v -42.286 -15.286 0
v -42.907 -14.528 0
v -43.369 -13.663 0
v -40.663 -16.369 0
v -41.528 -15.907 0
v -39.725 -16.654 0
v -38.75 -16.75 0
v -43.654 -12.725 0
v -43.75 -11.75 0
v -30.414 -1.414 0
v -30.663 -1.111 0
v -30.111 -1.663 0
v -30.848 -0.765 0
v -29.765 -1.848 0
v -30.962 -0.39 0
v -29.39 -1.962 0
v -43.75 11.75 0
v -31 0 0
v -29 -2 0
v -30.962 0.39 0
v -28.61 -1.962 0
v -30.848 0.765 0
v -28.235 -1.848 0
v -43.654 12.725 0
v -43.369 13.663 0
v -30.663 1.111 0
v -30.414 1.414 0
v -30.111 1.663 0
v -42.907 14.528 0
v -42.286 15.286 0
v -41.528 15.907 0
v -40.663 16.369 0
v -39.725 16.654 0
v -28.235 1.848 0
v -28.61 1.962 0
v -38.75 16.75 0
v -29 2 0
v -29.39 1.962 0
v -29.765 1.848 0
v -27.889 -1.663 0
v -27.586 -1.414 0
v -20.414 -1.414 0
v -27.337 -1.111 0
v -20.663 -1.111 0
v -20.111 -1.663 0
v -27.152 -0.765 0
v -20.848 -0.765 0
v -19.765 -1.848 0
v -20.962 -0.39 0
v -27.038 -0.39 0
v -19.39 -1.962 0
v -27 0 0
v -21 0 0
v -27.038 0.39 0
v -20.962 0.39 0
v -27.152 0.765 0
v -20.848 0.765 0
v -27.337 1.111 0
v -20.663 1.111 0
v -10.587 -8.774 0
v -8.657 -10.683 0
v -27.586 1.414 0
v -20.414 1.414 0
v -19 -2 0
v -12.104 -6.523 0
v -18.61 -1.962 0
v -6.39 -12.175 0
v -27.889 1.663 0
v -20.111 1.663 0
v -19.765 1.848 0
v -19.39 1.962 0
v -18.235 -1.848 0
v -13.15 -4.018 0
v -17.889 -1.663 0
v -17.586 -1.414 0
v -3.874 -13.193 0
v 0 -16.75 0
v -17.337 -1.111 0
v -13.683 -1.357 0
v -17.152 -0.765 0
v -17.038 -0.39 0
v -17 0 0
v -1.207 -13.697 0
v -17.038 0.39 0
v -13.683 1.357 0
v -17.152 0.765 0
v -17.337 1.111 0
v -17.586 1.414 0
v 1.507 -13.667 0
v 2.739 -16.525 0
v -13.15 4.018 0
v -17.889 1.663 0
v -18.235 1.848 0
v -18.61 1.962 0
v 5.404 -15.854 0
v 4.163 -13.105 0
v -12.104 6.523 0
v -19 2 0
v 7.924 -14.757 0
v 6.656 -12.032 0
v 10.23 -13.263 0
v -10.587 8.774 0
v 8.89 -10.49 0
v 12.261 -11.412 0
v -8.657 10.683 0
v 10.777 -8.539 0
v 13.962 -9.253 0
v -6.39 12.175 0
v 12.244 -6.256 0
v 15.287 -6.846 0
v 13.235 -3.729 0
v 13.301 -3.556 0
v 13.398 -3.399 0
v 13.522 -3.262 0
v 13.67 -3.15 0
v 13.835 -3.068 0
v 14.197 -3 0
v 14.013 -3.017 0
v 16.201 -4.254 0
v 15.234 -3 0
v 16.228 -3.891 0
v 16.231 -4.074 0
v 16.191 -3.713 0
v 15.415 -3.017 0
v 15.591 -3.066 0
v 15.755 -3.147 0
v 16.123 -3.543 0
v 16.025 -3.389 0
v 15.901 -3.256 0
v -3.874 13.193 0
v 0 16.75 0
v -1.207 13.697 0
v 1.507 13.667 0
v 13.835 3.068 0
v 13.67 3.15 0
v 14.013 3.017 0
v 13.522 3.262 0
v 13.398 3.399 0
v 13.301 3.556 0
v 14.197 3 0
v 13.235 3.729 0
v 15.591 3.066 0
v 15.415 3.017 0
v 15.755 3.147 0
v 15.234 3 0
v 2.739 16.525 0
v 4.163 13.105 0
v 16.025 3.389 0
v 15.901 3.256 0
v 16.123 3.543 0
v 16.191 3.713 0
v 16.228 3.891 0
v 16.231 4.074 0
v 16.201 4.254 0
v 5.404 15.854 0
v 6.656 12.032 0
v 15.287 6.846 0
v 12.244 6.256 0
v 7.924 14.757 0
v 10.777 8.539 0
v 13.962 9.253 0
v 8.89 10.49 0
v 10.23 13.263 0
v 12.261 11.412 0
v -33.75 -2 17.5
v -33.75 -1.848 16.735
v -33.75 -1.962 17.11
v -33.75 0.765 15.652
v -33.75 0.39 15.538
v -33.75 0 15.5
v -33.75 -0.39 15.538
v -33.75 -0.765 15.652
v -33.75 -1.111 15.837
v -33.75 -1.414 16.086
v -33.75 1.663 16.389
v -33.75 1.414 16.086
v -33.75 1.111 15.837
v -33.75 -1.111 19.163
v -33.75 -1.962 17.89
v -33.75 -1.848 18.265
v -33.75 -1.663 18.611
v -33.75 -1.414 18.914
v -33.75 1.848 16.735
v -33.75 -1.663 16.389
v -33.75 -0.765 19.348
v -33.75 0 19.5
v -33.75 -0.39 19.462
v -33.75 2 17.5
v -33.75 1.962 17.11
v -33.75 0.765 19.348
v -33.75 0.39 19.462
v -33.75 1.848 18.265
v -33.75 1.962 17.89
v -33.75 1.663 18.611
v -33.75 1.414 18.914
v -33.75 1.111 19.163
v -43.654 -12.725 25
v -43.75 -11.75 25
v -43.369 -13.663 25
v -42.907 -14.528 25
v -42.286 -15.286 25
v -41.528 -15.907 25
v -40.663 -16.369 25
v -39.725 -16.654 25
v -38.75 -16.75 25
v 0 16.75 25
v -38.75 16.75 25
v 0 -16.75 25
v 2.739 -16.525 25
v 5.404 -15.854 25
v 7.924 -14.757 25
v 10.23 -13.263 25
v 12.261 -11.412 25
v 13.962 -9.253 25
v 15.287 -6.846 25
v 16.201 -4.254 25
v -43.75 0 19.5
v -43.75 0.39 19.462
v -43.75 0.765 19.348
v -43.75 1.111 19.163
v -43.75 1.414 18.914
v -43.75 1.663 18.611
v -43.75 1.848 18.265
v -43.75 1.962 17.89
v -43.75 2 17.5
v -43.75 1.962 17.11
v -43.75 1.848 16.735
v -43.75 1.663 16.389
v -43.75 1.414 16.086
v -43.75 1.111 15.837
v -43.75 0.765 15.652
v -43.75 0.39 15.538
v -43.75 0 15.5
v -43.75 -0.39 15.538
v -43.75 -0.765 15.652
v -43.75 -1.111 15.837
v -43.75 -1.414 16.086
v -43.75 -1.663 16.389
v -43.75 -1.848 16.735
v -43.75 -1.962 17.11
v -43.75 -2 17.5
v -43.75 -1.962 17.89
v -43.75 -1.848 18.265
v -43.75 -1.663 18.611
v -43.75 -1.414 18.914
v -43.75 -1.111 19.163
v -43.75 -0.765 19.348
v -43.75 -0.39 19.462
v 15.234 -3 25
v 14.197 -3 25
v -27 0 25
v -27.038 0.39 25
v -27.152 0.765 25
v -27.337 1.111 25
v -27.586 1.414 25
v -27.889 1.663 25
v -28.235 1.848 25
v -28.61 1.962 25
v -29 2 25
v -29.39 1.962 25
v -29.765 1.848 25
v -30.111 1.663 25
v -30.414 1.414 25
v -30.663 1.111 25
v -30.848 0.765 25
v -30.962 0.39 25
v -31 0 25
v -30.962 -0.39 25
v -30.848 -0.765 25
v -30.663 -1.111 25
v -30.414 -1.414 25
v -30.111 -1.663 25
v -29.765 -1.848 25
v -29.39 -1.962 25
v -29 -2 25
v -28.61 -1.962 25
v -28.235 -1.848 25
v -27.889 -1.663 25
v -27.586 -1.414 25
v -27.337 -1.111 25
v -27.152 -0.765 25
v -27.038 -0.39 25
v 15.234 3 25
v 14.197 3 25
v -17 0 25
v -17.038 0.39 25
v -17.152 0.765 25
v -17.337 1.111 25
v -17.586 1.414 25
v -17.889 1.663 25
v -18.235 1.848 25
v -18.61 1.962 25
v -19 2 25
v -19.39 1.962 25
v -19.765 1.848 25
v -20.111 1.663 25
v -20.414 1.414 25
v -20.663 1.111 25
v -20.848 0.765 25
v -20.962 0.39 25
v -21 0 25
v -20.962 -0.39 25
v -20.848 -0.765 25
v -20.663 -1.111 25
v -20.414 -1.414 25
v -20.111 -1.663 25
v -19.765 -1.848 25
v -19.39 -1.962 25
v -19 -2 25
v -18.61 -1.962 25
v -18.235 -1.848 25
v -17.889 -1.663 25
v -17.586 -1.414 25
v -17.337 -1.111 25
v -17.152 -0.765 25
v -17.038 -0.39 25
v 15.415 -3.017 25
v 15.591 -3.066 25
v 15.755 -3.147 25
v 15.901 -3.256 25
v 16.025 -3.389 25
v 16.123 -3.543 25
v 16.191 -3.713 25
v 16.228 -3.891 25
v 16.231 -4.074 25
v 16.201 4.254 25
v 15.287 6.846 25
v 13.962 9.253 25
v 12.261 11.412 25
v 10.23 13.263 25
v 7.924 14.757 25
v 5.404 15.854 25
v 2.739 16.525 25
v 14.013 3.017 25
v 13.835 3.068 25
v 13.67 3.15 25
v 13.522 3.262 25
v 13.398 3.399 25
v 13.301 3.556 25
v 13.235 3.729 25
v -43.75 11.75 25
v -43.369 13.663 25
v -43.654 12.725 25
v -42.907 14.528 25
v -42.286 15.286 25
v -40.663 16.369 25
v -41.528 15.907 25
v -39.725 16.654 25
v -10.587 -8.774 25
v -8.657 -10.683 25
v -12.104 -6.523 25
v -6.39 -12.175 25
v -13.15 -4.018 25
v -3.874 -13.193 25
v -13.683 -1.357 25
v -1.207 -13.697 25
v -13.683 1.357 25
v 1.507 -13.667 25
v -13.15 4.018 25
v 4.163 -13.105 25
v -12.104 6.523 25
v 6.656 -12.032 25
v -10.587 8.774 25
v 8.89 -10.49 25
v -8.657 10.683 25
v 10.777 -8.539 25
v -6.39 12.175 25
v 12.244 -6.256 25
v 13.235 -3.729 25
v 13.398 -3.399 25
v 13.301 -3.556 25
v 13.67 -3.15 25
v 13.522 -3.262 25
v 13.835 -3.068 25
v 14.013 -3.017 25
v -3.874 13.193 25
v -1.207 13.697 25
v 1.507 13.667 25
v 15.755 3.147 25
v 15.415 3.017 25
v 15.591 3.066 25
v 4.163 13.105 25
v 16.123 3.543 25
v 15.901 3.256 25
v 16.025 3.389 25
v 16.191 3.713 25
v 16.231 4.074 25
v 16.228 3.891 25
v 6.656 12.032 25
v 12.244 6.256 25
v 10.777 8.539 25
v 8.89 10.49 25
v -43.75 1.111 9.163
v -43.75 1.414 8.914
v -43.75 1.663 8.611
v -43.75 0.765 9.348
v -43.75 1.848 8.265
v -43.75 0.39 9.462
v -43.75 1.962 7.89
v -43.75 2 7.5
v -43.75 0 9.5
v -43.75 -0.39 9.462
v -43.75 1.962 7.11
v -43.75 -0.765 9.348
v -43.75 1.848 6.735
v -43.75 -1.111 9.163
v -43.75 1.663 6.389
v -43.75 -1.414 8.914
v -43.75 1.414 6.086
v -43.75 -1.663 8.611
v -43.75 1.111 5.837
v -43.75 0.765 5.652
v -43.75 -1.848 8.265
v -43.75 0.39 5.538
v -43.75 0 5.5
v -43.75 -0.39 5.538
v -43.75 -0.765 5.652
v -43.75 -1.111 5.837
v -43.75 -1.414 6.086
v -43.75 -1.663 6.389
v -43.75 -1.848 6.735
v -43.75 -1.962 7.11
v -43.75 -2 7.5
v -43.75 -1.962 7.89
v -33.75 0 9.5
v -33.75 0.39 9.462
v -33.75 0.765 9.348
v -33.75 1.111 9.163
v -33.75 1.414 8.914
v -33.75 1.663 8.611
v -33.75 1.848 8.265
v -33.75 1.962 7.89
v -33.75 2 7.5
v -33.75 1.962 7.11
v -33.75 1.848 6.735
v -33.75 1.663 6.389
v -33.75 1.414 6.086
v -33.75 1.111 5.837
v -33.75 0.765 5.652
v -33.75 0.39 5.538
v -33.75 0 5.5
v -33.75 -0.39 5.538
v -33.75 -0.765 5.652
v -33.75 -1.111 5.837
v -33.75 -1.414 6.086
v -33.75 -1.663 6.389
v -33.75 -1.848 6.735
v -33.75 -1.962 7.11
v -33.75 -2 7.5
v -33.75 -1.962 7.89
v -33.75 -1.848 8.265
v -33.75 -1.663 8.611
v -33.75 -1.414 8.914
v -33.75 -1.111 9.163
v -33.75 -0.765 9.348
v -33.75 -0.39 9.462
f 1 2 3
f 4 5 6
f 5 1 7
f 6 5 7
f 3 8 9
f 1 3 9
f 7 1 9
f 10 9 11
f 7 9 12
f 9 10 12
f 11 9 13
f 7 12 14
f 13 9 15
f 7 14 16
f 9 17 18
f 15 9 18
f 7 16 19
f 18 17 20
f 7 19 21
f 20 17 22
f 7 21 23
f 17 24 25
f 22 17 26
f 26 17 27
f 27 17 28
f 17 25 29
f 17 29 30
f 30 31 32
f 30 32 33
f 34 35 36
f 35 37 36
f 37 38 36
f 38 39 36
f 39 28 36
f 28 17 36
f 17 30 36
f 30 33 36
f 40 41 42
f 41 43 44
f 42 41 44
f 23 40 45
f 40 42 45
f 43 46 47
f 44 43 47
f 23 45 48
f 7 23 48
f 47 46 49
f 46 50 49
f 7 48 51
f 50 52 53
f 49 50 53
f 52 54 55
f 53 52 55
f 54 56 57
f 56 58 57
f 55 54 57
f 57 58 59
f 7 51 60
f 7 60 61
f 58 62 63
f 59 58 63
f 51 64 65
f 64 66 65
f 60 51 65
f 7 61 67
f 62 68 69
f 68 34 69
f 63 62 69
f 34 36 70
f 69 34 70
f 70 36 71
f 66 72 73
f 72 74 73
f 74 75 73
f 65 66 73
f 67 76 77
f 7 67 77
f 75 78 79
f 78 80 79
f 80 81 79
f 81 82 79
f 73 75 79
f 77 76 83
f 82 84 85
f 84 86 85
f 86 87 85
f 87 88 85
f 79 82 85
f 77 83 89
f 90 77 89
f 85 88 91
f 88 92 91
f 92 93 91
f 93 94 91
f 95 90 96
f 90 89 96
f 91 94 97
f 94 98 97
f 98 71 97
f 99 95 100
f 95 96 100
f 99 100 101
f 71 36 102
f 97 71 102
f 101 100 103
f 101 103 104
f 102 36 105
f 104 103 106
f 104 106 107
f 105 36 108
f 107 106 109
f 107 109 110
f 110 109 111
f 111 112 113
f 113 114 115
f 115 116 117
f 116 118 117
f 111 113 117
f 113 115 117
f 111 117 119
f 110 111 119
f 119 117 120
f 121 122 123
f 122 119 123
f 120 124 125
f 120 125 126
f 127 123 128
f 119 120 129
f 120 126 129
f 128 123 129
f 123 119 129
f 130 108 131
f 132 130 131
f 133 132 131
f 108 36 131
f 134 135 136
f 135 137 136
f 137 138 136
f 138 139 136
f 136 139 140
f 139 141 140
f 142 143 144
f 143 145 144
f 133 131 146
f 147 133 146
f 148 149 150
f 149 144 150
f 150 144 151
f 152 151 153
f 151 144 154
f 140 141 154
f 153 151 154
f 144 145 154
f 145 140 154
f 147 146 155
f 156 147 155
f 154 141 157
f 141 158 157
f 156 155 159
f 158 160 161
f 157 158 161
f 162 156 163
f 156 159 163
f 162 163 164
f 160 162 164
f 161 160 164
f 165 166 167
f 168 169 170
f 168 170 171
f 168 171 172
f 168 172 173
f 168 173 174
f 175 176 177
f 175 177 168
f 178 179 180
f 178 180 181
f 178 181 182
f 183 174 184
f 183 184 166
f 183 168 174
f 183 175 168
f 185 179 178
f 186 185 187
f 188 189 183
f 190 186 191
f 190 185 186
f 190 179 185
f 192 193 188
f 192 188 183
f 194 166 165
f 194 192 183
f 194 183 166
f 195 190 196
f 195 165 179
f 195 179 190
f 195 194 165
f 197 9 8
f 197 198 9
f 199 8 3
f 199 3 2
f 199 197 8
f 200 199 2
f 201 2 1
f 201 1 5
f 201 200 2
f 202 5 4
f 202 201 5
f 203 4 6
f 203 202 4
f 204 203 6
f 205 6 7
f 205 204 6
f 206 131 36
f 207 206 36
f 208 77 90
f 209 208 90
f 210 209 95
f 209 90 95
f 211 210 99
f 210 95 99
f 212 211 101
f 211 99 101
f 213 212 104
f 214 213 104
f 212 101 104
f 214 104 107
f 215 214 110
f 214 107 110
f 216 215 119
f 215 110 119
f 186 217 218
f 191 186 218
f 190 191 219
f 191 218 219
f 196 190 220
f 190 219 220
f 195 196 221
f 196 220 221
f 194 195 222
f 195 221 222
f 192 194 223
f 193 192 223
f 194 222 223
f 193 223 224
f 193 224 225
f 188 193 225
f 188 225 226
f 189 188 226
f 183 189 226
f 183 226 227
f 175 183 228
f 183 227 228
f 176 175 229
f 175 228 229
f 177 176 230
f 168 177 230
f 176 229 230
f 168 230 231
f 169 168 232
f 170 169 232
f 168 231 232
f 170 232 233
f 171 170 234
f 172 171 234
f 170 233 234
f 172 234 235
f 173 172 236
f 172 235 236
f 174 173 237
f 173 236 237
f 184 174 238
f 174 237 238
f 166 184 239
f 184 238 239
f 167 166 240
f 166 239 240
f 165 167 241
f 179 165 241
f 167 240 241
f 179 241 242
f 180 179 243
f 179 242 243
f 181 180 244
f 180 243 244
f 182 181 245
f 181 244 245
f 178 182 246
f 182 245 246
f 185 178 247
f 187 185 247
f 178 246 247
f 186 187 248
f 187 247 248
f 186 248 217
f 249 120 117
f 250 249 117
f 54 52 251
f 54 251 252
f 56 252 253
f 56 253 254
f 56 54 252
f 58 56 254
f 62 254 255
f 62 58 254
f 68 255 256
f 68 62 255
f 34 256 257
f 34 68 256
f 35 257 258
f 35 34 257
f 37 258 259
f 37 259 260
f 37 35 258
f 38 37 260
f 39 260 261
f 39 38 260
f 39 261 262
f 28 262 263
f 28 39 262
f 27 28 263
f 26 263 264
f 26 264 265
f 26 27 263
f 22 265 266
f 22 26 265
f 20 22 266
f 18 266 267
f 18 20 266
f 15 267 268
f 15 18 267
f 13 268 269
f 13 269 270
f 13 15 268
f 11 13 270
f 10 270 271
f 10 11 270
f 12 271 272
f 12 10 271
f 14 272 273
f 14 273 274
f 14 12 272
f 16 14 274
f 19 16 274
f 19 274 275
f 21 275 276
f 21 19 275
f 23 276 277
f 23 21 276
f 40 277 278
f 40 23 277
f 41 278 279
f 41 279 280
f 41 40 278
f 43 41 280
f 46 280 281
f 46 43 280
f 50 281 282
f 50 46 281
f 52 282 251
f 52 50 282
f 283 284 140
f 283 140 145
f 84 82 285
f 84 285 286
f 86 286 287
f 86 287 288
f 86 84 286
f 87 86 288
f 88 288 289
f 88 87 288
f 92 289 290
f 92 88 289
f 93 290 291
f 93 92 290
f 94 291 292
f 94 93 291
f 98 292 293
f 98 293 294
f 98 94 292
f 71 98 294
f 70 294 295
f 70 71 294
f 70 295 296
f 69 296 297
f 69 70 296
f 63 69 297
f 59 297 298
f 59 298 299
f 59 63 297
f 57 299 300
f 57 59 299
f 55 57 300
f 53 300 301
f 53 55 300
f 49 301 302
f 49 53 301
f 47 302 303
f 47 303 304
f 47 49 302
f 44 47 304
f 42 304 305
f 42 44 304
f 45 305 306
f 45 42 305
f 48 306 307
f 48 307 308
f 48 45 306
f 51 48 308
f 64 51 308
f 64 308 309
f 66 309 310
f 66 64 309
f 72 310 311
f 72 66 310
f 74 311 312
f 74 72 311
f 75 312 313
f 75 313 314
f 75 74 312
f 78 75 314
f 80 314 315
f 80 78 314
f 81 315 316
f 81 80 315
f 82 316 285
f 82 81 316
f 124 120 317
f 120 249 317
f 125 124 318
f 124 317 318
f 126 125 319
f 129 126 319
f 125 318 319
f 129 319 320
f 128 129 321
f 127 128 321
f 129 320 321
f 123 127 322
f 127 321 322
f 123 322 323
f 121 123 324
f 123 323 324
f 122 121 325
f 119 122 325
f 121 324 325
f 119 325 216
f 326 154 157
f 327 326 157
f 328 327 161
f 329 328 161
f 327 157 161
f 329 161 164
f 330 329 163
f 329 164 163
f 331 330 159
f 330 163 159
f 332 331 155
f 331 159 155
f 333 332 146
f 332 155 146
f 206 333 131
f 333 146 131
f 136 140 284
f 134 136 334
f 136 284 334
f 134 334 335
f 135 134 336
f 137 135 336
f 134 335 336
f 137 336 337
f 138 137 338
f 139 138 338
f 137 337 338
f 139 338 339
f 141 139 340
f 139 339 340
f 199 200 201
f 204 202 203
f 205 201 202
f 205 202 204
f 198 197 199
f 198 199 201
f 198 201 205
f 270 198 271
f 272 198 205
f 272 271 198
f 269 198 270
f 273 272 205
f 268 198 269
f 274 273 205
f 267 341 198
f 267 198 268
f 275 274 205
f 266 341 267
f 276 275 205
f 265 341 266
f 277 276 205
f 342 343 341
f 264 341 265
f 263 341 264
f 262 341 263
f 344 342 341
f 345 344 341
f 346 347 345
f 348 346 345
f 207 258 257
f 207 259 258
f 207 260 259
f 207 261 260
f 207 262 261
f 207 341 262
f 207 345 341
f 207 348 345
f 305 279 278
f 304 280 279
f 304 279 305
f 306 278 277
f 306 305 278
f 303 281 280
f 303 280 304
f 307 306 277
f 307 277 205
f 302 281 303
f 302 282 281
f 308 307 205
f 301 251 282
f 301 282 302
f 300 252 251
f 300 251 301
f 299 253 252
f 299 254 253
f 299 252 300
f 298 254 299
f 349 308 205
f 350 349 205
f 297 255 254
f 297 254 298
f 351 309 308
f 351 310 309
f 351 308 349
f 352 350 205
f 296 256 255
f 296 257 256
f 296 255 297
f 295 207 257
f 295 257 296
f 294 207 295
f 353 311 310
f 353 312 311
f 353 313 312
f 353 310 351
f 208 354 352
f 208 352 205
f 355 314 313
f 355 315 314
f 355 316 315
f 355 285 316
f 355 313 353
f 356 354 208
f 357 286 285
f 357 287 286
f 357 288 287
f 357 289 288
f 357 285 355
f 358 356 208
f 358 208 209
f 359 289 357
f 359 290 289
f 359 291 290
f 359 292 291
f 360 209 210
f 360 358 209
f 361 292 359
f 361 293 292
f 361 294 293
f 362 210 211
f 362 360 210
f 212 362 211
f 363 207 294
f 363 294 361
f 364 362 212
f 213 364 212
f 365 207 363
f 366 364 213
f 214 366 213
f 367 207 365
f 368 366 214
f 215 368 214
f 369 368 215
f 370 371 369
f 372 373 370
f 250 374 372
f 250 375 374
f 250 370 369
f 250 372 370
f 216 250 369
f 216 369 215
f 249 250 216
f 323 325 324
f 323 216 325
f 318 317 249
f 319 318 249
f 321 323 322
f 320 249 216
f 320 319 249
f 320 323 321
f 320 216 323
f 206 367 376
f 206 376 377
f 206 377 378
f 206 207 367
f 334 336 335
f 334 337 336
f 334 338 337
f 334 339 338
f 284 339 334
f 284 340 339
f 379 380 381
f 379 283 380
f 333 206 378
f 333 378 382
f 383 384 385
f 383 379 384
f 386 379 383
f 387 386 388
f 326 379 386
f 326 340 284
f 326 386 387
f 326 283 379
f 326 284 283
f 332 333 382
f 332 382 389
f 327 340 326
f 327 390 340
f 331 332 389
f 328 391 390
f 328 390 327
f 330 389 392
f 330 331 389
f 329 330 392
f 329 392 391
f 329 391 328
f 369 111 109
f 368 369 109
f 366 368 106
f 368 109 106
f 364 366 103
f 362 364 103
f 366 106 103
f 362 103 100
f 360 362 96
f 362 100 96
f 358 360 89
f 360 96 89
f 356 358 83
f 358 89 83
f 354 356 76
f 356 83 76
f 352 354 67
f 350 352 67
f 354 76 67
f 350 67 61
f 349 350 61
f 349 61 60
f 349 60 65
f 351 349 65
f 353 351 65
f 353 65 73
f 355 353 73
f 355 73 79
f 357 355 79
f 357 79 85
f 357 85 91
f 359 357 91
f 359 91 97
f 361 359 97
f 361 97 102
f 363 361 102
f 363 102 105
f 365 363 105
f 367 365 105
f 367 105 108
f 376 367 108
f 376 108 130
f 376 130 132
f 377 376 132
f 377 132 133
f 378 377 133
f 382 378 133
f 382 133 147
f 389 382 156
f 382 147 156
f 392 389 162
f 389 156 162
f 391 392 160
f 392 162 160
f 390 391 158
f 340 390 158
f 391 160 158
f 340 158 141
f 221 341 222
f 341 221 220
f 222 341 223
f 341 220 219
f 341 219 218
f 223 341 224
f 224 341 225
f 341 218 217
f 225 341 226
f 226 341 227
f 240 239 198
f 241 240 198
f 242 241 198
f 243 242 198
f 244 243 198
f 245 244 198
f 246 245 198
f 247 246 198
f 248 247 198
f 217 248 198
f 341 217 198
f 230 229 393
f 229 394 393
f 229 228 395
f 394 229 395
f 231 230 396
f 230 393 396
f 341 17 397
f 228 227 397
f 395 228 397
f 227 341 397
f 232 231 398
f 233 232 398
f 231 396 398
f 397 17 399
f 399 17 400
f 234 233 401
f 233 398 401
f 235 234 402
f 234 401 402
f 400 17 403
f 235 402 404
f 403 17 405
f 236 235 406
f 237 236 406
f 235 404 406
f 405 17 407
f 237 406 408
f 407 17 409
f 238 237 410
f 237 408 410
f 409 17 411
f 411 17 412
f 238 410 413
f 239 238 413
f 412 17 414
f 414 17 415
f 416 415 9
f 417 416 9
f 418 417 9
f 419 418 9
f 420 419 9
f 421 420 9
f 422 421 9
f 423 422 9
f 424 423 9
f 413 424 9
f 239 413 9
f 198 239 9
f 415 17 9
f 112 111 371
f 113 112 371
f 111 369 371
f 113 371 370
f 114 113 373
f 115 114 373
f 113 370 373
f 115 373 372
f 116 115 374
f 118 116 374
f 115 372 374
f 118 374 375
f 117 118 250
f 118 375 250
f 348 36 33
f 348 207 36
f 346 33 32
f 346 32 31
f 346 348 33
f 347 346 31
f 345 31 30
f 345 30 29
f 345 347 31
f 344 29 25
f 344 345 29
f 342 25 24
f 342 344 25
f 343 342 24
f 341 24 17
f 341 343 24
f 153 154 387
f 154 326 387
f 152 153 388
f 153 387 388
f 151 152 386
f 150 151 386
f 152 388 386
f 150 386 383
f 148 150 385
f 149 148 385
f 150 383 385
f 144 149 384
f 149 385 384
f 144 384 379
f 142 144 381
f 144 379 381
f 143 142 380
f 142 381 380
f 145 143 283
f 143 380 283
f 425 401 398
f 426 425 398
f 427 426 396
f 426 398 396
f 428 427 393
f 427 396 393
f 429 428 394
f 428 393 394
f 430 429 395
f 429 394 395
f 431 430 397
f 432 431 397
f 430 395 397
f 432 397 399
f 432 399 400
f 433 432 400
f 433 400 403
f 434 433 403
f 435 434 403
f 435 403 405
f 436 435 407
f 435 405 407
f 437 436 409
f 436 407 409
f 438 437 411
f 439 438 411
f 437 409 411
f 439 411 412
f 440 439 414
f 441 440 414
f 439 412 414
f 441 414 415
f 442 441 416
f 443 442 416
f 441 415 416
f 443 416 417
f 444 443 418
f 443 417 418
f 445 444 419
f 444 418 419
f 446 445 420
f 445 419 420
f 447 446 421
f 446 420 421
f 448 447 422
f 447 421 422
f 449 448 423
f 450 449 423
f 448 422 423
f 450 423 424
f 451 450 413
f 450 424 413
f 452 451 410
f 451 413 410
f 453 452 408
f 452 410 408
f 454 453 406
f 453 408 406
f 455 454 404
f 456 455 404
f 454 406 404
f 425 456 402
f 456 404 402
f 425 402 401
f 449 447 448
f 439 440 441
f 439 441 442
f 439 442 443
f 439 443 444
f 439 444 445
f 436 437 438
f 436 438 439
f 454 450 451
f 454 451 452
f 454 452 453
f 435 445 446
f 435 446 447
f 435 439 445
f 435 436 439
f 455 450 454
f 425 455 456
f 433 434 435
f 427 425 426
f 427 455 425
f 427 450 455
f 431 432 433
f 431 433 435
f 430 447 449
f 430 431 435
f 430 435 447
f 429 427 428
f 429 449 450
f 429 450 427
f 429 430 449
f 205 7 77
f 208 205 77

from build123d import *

# Parameters (mm, degrees)
ESQUISSE1_R             = 2
BOSS_EXTRU_1_DEPTH      = 25
ESQUISSE5_R             = 2
ENL_V_MAT_EXTRU_2_DEPTH = 10
CONG_1_R                = 5
CONG_2_R                = 1


with BuildPart() as part:
    # Esquisse1 → Boss.-Extru.1 (new body)
    with BuildSketch(Plane.XY):
        with BuildLine():
            Line((13.4187369, 3), (16.479153498, 3))
            ThreePointArc((16.479153498, 3), (10.731088016, 12.861036117), (0, 16.75))
            Line((0, 16.75), (-43.75, 16.75))
            Line((-43.75, 16.75), (-43.75, -16.75))
            Line((-43.75, -16.75), (0, -16.75))
            ThreePointArc((0, -16.75), (10.731088016, -12.861036117), (16.479153498, -3))
            Line((16.479153498, -3), (13.4187369, -3))
            ThreePointArc((13.4187369, -3), (-13.75, 0), (13.4187369, 3))
        make_face()
        with Locations((-29, 0)):
            Circle(ESQUISSE1_R, mode=Mode.SUBTRACT)
        with Locations((-19, 0)):
            Circle(ESQUISSE1_R, mode=Mode.SUBTRACT)
    extrude(amount=BOSS_EXTRU_1_DEPTH)

    # Esquisse5 → Enlèv. mat.-Extru.2 (cut)
    with BuildSketch(Plane.ZY.offset(43.75)):
        with Locations((7.5, 0)):
            Circle(ESQUISSE5_R)
        with Locations((17.5, 0)):
            Circle(ESQUISSE5_R)
    extrude(amount=-ENL_V_MAT_EXTRU_2_DEPTH, mode=Mode.SUBTRACT)

    # Congé1
    cong_1_edges = [part.edges().sort_by_distance(p)[0] for p in [
        (-43.75, -16.75, 12.5),
        (-43.75, 16.75, 12.5),
    ]]
    fillet(cong_1_edges, radius=CONG_1_R)

    # Congé2
    cong_2_edges = [part.edges().sort_by_distance(p)[0] for p in [
        (13.4187369, -3, 12.5),
        (16.479153498, -3, 12.5),
        (16.479153498, 3, 12.5),
        (13.4187369, 3, 12.5),
    ]]
    fillet(cong_2_edges, radius=CONG_2_R)


solid = part.part
